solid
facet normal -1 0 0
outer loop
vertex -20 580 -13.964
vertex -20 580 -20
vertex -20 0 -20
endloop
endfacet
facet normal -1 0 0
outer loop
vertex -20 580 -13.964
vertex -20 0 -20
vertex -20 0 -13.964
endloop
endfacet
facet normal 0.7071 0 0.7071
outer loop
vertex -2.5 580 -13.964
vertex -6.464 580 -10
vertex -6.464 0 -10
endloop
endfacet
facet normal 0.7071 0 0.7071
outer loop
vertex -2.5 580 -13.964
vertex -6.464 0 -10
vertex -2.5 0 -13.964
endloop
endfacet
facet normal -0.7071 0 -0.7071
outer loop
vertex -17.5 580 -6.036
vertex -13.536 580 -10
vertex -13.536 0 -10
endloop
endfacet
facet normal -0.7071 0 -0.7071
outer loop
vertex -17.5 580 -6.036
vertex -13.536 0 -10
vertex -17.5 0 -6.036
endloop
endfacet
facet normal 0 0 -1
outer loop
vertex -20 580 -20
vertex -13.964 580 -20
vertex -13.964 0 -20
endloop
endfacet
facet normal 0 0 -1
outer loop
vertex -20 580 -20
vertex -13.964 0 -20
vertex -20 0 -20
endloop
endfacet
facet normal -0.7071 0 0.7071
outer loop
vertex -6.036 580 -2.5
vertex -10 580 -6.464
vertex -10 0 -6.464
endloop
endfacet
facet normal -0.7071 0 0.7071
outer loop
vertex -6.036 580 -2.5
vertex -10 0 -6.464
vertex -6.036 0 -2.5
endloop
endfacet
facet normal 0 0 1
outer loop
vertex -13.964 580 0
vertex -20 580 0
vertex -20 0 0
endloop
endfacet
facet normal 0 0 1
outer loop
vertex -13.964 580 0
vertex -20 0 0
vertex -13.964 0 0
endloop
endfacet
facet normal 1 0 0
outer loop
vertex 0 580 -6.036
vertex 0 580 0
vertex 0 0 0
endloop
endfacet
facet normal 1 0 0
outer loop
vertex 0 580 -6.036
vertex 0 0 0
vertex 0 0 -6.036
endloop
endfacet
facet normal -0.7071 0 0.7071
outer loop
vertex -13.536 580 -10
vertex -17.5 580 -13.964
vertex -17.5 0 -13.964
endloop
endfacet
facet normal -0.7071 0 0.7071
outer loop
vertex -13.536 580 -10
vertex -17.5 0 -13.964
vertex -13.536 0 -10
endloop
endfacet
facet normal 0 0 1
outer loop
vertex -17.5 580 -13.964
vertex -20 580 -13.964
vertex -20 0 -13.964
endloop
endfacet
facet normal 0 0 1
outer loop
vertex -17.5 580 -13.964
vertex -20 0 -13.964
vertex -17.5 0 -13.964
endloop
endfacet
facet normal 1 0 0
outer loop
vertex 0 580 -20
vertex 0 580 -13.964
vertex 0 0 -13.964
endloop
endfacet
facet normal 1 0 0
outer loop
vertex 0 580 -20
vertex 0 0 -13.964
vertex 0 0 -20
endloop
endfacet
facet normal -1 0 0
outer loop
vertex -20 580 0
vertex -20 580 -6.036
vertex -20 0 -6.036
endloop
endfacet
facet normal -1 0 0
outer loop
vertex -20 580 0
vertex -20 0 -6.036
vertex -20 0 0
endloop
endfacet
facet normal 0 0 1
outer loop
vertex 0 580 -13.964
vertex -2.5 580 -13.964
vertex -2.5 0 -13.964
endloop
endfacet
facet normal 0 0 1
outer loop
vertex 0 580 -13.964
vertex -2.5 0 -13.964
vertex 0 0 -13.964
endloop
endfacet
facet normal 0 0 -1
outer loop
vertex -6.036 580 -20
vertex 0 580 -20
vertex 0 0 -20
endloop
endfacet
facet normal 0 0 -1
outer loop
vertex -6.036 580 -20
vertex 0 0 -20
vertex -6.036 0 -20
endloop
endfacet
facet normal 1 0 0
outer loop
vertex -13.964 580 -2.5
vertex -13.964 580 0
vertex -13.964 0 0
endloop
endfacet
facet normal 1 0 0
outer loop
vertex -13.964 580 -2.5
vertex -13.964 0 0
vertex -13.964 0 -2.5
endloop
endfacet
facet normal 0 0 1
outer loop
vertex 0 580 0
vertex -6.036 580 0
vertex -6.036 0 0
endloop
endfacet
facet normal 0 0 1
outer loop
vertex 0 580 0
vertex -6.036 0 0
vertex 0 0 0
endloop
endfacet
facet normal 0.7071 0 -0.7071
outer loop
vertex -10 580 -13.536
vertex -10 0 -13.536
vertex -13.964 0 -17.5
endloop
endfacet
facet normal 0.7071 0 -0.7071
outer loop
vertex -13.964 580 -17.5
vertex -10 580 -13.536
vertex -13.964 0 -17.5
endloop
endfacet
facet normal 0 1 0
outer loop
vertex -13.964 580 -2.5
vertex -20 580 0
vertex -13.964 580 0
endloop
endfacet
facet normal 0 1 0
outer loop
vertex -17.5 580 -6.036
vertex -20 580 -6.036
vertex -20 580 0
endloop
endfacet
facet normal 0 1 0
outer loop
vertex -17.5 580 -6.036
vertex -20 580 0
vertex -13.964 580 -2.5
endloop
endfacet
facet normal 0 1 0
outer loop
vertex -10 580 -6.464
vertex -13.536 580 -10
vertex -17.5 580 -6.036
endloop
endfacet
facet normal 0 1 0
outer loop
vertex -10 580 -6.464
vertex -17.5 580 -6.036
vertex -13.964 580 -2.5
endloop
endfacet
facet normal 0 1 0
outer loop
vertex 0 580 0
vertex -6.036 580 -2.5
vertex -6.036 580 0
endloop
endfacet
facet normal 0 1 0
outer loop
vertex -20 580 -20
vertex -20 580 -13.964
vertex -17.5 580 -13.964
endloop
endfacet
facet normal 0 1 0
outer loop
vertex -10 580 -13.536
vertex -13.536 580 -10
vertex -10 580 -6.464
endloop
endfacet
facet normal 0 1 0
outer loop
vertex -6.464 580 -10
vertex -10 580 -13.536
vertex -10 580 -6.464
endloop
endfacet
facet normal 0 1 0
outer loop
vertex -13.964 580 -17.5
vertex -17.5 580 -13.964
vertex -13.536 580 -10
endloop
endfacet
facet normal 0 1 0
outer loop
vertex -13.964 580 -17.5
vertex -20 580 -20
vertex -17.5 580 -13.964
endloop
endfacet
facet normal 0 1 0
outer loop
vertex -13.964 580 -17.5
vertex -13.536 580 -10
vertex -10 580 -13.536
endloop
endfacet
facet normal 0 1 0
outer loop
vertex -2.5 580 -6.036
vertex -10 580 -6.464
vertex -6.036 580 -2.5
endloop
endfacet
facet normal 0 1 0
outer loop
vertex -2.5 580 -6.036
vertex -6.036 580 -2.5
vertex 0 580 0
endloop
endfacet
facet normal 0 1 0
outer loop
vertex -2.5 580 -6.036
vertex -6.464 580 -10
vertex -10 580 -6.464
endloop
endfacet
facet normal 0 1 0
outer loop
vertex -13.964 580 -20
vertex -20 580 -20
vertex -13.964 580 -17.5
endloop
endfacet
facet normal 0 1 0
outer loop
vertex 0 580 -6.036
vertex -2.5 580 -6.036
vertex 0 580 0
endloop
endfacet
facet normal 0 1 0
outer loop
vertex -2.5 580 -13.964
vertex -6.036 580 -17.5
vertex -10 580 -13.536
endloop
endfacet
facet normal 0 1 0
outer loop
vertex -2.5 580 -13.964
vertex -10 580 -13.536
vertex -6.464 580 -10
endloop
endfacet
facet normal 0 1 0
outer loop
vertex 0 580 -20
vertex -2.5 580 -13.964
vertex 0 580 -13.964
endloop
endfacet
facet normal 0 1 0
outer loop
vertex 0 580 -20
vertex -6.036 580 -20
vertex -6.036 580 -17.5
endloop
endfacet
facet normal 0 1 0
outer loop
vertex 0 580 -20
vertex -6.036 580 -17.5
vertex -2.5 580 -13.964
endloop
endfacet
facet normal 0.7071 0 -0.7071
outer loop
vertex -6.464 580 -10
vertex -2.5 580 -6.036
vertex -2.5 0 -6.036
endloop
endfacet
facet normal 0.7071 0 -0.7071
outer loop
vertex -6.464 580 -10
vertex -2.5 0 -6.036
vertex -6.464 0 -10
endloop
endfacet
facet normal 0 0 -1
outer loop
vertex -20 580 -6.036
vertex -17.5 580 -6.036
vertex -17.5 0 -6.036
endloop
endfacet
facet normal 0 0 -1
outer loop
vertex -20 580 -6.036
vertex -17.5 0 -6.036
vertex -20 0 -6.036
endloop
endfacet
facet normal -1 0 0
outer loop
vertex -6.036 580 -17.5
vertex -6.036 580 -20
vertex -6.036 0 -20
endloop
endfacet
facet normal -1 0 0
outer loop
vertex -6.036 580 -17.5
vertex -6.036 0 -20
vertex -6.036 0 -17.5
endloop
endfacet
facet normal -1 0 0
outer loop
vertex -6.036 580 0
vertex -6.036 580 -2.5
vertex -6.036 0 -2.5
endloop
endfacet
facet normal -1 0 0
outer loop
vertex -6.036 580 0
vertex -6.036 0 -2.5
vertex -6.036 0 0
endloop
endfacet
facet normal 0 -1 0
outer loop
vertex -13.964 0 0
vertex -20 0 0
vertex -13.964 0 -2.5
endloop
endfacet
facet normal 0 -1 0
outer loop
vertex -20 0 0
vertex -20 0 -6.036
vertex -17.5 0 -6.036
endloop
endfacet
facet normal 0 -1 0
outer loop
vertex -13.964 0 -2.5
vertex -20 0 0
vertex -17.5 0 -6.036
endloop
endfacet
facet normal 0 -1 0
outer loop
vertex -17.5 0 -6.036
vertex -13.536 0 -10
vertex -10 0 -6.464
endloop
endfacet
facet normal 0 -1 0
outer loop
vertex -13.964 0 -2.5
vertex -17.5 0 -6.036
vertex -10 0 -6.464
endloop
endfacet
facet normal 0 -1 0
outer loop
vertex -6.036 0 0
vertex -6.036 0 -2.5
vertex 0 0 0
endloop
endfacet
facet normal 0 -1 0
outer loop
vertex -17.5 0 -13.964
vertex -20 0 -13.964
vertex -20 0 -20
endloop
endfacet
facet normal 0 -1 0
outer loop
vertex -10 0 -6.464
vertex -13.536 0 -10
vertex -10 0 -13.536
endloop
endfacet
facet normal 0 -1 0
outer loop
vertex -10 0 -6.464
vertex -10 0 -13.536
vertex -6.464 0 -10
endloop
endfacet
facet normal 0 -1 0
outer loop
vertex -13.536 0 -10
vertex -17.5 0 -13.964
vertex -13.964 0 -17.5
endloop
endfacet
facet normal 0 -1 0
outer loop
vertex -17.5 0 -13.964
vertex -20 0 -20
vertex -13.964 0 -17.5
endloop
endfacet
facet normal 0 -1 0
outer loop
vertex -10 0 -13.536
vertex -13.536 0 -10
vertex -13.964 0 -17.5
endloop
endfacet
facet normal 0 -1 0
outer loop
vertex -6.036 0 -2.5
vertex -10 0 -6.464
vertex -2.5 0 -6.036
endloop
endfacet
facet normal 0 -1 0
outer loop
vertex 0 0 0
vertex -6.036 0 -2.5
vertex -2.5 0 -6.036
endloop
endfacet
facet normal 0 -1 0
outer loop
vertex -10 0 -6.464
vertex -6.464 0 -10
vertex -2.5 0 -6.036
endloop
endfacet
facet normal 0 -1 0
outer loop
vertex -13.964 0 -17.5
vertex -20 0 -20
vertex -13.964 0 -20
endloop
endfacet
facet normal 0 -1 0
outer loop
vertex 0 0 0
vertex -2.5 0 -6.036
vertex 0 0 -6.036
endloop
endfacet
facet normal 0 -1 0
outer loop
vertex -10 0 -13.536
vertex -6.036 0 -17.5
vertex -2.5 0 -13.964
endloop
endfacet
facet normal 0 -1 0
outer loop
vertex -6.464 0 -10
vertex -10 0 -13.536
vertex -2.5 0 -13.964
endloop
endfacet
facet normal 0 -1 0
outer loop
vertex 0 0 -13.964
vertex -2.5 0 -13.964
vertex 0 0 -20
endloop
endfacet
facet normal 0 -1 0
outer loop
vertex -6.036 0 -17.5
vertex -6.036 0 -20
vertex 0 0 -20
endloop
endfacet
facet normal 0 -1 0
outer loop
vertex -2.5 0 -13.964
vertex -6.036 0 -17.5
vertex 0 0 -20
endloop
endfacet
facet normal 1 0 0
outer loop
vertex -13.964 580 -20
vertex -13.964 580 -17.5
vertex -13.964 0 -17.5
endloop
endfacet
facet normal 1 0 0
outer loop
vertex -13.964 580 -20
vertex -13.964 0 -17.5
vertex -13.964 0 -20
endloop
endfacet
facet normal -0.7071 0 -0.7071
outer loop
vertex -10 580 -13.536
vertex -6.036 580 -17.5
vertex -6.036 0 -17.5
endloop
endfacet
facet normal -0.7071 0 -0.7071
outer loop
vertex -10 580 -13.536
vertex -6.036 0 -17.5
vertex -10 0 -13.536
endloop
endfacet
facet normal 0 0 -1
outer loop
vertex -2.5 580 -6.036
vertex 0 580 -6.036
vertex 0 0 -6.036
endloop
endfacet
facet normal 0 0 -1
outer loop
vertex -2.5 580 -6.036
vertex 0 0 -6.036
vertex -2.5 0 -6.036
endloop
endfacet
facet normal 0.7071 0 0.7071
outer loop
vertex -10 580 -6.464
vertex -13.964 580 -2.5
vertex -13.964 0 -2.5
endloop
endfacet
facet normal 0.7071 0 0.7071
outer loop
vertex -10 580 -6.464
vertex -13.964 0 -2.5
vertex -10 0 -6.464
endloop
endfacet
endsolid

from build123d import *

# Parameters (mm, degrees)
BOSS_EXTRU_1_DEPTH = 580


with BuildPart() as part:
    # Esquisse1 → Boss.-Extru.1 (new body)
    with BuildSketch(Plane(origin=(0, 0, 0), x_dir=(1, 0, 0), z_dir=(0, 1, 0))):
        Polygon((-3.535533906, 0), (-6.035533906, 2.5), (-6.035533906, 0), align=None)
        Polygon((0, 3.535533906), (-2.5, 6.035533906), (-2.5, 2.5), (-6.035533906, 2.5), (-3.535533906, 0), (0, 0), align=None)
        Polygon((0, 6.035533906), (-2.5, 6.035533906), (0, 3.535533906), align=None)
        Polygon((-2.5, 2.5), (-2.5, 6.035533906), (-6.464466094, 10), (-10, 6.464466094), (-6.035533906, 2.5), align=None)
        Polygon((-13.964466094, 0), (-13.964466094, 2.5), (-16.464466094, 0), align=None)
        Polygon((-17.5, 2.5), (-17.5, 6.035533906), (-20, 3.535533906), (-20, 0), (-16.464466094, 0), (-13.964466094, 2.5), align=None)
        Polygon((-20, 3.535533906), (-17.5, 6.035533906), (-20, 6.035533906), align=None)
        Polygon((-10, 6.464466094), (-13.535533906, 10), (-17.5, 6.035533906), (-17.5, 2.5), (-13.964466094, 2.5), align=None)
        Polygon((-6.464466094, 10), (-10, 13.535533906), (-13.535533906, 10), (-10, 6.464466094), align=None)
        Polygon((-2.5, 13.964466094), (-2.5, 17.5), (-6.035533906, 17.5), (-10, 13.535533906), (-6.464466094, 10), align=None)
        Polygon((-6.035533906, 17.5), (-2.5, 17.5), (-2.5, 13.964466094), (0, 16.464466094), (0, 20), (-3.535533906, 20), align=None)
        Polygon((0, 16.464466094), (-2.5, 13.964466094), (0, 13.964466094), align=None)
        Polygon((-6.035533906, 20), (-6.035533906, 17.5), (-3.535533906, 20), align=None)
        Polygon((-16.464466094, 20), (-13.964466094, 17.5), (-13.964466094, 20), align=None)
        Polygon((-17.5, 17.5), (-13.964466094, 17.5), (-16.464466094, 20), (-20, 20), (-20, 16.464466094), (-17.5, 13.964466094), align=None)
        Polygon((-20, 13.964466094), (-17.5, 13.964466094), (-20, 16.464466094), align=None)
        Polygon((-10, 13.535533906), (-13.964466094, 17.5), (-17.5, 17.5), (-17.5, 13.964466094), (-13.535533906, 10), align=None)
    extrude(amount=BOSS_EXTRU_1_DEPTH)


solid = part.part
